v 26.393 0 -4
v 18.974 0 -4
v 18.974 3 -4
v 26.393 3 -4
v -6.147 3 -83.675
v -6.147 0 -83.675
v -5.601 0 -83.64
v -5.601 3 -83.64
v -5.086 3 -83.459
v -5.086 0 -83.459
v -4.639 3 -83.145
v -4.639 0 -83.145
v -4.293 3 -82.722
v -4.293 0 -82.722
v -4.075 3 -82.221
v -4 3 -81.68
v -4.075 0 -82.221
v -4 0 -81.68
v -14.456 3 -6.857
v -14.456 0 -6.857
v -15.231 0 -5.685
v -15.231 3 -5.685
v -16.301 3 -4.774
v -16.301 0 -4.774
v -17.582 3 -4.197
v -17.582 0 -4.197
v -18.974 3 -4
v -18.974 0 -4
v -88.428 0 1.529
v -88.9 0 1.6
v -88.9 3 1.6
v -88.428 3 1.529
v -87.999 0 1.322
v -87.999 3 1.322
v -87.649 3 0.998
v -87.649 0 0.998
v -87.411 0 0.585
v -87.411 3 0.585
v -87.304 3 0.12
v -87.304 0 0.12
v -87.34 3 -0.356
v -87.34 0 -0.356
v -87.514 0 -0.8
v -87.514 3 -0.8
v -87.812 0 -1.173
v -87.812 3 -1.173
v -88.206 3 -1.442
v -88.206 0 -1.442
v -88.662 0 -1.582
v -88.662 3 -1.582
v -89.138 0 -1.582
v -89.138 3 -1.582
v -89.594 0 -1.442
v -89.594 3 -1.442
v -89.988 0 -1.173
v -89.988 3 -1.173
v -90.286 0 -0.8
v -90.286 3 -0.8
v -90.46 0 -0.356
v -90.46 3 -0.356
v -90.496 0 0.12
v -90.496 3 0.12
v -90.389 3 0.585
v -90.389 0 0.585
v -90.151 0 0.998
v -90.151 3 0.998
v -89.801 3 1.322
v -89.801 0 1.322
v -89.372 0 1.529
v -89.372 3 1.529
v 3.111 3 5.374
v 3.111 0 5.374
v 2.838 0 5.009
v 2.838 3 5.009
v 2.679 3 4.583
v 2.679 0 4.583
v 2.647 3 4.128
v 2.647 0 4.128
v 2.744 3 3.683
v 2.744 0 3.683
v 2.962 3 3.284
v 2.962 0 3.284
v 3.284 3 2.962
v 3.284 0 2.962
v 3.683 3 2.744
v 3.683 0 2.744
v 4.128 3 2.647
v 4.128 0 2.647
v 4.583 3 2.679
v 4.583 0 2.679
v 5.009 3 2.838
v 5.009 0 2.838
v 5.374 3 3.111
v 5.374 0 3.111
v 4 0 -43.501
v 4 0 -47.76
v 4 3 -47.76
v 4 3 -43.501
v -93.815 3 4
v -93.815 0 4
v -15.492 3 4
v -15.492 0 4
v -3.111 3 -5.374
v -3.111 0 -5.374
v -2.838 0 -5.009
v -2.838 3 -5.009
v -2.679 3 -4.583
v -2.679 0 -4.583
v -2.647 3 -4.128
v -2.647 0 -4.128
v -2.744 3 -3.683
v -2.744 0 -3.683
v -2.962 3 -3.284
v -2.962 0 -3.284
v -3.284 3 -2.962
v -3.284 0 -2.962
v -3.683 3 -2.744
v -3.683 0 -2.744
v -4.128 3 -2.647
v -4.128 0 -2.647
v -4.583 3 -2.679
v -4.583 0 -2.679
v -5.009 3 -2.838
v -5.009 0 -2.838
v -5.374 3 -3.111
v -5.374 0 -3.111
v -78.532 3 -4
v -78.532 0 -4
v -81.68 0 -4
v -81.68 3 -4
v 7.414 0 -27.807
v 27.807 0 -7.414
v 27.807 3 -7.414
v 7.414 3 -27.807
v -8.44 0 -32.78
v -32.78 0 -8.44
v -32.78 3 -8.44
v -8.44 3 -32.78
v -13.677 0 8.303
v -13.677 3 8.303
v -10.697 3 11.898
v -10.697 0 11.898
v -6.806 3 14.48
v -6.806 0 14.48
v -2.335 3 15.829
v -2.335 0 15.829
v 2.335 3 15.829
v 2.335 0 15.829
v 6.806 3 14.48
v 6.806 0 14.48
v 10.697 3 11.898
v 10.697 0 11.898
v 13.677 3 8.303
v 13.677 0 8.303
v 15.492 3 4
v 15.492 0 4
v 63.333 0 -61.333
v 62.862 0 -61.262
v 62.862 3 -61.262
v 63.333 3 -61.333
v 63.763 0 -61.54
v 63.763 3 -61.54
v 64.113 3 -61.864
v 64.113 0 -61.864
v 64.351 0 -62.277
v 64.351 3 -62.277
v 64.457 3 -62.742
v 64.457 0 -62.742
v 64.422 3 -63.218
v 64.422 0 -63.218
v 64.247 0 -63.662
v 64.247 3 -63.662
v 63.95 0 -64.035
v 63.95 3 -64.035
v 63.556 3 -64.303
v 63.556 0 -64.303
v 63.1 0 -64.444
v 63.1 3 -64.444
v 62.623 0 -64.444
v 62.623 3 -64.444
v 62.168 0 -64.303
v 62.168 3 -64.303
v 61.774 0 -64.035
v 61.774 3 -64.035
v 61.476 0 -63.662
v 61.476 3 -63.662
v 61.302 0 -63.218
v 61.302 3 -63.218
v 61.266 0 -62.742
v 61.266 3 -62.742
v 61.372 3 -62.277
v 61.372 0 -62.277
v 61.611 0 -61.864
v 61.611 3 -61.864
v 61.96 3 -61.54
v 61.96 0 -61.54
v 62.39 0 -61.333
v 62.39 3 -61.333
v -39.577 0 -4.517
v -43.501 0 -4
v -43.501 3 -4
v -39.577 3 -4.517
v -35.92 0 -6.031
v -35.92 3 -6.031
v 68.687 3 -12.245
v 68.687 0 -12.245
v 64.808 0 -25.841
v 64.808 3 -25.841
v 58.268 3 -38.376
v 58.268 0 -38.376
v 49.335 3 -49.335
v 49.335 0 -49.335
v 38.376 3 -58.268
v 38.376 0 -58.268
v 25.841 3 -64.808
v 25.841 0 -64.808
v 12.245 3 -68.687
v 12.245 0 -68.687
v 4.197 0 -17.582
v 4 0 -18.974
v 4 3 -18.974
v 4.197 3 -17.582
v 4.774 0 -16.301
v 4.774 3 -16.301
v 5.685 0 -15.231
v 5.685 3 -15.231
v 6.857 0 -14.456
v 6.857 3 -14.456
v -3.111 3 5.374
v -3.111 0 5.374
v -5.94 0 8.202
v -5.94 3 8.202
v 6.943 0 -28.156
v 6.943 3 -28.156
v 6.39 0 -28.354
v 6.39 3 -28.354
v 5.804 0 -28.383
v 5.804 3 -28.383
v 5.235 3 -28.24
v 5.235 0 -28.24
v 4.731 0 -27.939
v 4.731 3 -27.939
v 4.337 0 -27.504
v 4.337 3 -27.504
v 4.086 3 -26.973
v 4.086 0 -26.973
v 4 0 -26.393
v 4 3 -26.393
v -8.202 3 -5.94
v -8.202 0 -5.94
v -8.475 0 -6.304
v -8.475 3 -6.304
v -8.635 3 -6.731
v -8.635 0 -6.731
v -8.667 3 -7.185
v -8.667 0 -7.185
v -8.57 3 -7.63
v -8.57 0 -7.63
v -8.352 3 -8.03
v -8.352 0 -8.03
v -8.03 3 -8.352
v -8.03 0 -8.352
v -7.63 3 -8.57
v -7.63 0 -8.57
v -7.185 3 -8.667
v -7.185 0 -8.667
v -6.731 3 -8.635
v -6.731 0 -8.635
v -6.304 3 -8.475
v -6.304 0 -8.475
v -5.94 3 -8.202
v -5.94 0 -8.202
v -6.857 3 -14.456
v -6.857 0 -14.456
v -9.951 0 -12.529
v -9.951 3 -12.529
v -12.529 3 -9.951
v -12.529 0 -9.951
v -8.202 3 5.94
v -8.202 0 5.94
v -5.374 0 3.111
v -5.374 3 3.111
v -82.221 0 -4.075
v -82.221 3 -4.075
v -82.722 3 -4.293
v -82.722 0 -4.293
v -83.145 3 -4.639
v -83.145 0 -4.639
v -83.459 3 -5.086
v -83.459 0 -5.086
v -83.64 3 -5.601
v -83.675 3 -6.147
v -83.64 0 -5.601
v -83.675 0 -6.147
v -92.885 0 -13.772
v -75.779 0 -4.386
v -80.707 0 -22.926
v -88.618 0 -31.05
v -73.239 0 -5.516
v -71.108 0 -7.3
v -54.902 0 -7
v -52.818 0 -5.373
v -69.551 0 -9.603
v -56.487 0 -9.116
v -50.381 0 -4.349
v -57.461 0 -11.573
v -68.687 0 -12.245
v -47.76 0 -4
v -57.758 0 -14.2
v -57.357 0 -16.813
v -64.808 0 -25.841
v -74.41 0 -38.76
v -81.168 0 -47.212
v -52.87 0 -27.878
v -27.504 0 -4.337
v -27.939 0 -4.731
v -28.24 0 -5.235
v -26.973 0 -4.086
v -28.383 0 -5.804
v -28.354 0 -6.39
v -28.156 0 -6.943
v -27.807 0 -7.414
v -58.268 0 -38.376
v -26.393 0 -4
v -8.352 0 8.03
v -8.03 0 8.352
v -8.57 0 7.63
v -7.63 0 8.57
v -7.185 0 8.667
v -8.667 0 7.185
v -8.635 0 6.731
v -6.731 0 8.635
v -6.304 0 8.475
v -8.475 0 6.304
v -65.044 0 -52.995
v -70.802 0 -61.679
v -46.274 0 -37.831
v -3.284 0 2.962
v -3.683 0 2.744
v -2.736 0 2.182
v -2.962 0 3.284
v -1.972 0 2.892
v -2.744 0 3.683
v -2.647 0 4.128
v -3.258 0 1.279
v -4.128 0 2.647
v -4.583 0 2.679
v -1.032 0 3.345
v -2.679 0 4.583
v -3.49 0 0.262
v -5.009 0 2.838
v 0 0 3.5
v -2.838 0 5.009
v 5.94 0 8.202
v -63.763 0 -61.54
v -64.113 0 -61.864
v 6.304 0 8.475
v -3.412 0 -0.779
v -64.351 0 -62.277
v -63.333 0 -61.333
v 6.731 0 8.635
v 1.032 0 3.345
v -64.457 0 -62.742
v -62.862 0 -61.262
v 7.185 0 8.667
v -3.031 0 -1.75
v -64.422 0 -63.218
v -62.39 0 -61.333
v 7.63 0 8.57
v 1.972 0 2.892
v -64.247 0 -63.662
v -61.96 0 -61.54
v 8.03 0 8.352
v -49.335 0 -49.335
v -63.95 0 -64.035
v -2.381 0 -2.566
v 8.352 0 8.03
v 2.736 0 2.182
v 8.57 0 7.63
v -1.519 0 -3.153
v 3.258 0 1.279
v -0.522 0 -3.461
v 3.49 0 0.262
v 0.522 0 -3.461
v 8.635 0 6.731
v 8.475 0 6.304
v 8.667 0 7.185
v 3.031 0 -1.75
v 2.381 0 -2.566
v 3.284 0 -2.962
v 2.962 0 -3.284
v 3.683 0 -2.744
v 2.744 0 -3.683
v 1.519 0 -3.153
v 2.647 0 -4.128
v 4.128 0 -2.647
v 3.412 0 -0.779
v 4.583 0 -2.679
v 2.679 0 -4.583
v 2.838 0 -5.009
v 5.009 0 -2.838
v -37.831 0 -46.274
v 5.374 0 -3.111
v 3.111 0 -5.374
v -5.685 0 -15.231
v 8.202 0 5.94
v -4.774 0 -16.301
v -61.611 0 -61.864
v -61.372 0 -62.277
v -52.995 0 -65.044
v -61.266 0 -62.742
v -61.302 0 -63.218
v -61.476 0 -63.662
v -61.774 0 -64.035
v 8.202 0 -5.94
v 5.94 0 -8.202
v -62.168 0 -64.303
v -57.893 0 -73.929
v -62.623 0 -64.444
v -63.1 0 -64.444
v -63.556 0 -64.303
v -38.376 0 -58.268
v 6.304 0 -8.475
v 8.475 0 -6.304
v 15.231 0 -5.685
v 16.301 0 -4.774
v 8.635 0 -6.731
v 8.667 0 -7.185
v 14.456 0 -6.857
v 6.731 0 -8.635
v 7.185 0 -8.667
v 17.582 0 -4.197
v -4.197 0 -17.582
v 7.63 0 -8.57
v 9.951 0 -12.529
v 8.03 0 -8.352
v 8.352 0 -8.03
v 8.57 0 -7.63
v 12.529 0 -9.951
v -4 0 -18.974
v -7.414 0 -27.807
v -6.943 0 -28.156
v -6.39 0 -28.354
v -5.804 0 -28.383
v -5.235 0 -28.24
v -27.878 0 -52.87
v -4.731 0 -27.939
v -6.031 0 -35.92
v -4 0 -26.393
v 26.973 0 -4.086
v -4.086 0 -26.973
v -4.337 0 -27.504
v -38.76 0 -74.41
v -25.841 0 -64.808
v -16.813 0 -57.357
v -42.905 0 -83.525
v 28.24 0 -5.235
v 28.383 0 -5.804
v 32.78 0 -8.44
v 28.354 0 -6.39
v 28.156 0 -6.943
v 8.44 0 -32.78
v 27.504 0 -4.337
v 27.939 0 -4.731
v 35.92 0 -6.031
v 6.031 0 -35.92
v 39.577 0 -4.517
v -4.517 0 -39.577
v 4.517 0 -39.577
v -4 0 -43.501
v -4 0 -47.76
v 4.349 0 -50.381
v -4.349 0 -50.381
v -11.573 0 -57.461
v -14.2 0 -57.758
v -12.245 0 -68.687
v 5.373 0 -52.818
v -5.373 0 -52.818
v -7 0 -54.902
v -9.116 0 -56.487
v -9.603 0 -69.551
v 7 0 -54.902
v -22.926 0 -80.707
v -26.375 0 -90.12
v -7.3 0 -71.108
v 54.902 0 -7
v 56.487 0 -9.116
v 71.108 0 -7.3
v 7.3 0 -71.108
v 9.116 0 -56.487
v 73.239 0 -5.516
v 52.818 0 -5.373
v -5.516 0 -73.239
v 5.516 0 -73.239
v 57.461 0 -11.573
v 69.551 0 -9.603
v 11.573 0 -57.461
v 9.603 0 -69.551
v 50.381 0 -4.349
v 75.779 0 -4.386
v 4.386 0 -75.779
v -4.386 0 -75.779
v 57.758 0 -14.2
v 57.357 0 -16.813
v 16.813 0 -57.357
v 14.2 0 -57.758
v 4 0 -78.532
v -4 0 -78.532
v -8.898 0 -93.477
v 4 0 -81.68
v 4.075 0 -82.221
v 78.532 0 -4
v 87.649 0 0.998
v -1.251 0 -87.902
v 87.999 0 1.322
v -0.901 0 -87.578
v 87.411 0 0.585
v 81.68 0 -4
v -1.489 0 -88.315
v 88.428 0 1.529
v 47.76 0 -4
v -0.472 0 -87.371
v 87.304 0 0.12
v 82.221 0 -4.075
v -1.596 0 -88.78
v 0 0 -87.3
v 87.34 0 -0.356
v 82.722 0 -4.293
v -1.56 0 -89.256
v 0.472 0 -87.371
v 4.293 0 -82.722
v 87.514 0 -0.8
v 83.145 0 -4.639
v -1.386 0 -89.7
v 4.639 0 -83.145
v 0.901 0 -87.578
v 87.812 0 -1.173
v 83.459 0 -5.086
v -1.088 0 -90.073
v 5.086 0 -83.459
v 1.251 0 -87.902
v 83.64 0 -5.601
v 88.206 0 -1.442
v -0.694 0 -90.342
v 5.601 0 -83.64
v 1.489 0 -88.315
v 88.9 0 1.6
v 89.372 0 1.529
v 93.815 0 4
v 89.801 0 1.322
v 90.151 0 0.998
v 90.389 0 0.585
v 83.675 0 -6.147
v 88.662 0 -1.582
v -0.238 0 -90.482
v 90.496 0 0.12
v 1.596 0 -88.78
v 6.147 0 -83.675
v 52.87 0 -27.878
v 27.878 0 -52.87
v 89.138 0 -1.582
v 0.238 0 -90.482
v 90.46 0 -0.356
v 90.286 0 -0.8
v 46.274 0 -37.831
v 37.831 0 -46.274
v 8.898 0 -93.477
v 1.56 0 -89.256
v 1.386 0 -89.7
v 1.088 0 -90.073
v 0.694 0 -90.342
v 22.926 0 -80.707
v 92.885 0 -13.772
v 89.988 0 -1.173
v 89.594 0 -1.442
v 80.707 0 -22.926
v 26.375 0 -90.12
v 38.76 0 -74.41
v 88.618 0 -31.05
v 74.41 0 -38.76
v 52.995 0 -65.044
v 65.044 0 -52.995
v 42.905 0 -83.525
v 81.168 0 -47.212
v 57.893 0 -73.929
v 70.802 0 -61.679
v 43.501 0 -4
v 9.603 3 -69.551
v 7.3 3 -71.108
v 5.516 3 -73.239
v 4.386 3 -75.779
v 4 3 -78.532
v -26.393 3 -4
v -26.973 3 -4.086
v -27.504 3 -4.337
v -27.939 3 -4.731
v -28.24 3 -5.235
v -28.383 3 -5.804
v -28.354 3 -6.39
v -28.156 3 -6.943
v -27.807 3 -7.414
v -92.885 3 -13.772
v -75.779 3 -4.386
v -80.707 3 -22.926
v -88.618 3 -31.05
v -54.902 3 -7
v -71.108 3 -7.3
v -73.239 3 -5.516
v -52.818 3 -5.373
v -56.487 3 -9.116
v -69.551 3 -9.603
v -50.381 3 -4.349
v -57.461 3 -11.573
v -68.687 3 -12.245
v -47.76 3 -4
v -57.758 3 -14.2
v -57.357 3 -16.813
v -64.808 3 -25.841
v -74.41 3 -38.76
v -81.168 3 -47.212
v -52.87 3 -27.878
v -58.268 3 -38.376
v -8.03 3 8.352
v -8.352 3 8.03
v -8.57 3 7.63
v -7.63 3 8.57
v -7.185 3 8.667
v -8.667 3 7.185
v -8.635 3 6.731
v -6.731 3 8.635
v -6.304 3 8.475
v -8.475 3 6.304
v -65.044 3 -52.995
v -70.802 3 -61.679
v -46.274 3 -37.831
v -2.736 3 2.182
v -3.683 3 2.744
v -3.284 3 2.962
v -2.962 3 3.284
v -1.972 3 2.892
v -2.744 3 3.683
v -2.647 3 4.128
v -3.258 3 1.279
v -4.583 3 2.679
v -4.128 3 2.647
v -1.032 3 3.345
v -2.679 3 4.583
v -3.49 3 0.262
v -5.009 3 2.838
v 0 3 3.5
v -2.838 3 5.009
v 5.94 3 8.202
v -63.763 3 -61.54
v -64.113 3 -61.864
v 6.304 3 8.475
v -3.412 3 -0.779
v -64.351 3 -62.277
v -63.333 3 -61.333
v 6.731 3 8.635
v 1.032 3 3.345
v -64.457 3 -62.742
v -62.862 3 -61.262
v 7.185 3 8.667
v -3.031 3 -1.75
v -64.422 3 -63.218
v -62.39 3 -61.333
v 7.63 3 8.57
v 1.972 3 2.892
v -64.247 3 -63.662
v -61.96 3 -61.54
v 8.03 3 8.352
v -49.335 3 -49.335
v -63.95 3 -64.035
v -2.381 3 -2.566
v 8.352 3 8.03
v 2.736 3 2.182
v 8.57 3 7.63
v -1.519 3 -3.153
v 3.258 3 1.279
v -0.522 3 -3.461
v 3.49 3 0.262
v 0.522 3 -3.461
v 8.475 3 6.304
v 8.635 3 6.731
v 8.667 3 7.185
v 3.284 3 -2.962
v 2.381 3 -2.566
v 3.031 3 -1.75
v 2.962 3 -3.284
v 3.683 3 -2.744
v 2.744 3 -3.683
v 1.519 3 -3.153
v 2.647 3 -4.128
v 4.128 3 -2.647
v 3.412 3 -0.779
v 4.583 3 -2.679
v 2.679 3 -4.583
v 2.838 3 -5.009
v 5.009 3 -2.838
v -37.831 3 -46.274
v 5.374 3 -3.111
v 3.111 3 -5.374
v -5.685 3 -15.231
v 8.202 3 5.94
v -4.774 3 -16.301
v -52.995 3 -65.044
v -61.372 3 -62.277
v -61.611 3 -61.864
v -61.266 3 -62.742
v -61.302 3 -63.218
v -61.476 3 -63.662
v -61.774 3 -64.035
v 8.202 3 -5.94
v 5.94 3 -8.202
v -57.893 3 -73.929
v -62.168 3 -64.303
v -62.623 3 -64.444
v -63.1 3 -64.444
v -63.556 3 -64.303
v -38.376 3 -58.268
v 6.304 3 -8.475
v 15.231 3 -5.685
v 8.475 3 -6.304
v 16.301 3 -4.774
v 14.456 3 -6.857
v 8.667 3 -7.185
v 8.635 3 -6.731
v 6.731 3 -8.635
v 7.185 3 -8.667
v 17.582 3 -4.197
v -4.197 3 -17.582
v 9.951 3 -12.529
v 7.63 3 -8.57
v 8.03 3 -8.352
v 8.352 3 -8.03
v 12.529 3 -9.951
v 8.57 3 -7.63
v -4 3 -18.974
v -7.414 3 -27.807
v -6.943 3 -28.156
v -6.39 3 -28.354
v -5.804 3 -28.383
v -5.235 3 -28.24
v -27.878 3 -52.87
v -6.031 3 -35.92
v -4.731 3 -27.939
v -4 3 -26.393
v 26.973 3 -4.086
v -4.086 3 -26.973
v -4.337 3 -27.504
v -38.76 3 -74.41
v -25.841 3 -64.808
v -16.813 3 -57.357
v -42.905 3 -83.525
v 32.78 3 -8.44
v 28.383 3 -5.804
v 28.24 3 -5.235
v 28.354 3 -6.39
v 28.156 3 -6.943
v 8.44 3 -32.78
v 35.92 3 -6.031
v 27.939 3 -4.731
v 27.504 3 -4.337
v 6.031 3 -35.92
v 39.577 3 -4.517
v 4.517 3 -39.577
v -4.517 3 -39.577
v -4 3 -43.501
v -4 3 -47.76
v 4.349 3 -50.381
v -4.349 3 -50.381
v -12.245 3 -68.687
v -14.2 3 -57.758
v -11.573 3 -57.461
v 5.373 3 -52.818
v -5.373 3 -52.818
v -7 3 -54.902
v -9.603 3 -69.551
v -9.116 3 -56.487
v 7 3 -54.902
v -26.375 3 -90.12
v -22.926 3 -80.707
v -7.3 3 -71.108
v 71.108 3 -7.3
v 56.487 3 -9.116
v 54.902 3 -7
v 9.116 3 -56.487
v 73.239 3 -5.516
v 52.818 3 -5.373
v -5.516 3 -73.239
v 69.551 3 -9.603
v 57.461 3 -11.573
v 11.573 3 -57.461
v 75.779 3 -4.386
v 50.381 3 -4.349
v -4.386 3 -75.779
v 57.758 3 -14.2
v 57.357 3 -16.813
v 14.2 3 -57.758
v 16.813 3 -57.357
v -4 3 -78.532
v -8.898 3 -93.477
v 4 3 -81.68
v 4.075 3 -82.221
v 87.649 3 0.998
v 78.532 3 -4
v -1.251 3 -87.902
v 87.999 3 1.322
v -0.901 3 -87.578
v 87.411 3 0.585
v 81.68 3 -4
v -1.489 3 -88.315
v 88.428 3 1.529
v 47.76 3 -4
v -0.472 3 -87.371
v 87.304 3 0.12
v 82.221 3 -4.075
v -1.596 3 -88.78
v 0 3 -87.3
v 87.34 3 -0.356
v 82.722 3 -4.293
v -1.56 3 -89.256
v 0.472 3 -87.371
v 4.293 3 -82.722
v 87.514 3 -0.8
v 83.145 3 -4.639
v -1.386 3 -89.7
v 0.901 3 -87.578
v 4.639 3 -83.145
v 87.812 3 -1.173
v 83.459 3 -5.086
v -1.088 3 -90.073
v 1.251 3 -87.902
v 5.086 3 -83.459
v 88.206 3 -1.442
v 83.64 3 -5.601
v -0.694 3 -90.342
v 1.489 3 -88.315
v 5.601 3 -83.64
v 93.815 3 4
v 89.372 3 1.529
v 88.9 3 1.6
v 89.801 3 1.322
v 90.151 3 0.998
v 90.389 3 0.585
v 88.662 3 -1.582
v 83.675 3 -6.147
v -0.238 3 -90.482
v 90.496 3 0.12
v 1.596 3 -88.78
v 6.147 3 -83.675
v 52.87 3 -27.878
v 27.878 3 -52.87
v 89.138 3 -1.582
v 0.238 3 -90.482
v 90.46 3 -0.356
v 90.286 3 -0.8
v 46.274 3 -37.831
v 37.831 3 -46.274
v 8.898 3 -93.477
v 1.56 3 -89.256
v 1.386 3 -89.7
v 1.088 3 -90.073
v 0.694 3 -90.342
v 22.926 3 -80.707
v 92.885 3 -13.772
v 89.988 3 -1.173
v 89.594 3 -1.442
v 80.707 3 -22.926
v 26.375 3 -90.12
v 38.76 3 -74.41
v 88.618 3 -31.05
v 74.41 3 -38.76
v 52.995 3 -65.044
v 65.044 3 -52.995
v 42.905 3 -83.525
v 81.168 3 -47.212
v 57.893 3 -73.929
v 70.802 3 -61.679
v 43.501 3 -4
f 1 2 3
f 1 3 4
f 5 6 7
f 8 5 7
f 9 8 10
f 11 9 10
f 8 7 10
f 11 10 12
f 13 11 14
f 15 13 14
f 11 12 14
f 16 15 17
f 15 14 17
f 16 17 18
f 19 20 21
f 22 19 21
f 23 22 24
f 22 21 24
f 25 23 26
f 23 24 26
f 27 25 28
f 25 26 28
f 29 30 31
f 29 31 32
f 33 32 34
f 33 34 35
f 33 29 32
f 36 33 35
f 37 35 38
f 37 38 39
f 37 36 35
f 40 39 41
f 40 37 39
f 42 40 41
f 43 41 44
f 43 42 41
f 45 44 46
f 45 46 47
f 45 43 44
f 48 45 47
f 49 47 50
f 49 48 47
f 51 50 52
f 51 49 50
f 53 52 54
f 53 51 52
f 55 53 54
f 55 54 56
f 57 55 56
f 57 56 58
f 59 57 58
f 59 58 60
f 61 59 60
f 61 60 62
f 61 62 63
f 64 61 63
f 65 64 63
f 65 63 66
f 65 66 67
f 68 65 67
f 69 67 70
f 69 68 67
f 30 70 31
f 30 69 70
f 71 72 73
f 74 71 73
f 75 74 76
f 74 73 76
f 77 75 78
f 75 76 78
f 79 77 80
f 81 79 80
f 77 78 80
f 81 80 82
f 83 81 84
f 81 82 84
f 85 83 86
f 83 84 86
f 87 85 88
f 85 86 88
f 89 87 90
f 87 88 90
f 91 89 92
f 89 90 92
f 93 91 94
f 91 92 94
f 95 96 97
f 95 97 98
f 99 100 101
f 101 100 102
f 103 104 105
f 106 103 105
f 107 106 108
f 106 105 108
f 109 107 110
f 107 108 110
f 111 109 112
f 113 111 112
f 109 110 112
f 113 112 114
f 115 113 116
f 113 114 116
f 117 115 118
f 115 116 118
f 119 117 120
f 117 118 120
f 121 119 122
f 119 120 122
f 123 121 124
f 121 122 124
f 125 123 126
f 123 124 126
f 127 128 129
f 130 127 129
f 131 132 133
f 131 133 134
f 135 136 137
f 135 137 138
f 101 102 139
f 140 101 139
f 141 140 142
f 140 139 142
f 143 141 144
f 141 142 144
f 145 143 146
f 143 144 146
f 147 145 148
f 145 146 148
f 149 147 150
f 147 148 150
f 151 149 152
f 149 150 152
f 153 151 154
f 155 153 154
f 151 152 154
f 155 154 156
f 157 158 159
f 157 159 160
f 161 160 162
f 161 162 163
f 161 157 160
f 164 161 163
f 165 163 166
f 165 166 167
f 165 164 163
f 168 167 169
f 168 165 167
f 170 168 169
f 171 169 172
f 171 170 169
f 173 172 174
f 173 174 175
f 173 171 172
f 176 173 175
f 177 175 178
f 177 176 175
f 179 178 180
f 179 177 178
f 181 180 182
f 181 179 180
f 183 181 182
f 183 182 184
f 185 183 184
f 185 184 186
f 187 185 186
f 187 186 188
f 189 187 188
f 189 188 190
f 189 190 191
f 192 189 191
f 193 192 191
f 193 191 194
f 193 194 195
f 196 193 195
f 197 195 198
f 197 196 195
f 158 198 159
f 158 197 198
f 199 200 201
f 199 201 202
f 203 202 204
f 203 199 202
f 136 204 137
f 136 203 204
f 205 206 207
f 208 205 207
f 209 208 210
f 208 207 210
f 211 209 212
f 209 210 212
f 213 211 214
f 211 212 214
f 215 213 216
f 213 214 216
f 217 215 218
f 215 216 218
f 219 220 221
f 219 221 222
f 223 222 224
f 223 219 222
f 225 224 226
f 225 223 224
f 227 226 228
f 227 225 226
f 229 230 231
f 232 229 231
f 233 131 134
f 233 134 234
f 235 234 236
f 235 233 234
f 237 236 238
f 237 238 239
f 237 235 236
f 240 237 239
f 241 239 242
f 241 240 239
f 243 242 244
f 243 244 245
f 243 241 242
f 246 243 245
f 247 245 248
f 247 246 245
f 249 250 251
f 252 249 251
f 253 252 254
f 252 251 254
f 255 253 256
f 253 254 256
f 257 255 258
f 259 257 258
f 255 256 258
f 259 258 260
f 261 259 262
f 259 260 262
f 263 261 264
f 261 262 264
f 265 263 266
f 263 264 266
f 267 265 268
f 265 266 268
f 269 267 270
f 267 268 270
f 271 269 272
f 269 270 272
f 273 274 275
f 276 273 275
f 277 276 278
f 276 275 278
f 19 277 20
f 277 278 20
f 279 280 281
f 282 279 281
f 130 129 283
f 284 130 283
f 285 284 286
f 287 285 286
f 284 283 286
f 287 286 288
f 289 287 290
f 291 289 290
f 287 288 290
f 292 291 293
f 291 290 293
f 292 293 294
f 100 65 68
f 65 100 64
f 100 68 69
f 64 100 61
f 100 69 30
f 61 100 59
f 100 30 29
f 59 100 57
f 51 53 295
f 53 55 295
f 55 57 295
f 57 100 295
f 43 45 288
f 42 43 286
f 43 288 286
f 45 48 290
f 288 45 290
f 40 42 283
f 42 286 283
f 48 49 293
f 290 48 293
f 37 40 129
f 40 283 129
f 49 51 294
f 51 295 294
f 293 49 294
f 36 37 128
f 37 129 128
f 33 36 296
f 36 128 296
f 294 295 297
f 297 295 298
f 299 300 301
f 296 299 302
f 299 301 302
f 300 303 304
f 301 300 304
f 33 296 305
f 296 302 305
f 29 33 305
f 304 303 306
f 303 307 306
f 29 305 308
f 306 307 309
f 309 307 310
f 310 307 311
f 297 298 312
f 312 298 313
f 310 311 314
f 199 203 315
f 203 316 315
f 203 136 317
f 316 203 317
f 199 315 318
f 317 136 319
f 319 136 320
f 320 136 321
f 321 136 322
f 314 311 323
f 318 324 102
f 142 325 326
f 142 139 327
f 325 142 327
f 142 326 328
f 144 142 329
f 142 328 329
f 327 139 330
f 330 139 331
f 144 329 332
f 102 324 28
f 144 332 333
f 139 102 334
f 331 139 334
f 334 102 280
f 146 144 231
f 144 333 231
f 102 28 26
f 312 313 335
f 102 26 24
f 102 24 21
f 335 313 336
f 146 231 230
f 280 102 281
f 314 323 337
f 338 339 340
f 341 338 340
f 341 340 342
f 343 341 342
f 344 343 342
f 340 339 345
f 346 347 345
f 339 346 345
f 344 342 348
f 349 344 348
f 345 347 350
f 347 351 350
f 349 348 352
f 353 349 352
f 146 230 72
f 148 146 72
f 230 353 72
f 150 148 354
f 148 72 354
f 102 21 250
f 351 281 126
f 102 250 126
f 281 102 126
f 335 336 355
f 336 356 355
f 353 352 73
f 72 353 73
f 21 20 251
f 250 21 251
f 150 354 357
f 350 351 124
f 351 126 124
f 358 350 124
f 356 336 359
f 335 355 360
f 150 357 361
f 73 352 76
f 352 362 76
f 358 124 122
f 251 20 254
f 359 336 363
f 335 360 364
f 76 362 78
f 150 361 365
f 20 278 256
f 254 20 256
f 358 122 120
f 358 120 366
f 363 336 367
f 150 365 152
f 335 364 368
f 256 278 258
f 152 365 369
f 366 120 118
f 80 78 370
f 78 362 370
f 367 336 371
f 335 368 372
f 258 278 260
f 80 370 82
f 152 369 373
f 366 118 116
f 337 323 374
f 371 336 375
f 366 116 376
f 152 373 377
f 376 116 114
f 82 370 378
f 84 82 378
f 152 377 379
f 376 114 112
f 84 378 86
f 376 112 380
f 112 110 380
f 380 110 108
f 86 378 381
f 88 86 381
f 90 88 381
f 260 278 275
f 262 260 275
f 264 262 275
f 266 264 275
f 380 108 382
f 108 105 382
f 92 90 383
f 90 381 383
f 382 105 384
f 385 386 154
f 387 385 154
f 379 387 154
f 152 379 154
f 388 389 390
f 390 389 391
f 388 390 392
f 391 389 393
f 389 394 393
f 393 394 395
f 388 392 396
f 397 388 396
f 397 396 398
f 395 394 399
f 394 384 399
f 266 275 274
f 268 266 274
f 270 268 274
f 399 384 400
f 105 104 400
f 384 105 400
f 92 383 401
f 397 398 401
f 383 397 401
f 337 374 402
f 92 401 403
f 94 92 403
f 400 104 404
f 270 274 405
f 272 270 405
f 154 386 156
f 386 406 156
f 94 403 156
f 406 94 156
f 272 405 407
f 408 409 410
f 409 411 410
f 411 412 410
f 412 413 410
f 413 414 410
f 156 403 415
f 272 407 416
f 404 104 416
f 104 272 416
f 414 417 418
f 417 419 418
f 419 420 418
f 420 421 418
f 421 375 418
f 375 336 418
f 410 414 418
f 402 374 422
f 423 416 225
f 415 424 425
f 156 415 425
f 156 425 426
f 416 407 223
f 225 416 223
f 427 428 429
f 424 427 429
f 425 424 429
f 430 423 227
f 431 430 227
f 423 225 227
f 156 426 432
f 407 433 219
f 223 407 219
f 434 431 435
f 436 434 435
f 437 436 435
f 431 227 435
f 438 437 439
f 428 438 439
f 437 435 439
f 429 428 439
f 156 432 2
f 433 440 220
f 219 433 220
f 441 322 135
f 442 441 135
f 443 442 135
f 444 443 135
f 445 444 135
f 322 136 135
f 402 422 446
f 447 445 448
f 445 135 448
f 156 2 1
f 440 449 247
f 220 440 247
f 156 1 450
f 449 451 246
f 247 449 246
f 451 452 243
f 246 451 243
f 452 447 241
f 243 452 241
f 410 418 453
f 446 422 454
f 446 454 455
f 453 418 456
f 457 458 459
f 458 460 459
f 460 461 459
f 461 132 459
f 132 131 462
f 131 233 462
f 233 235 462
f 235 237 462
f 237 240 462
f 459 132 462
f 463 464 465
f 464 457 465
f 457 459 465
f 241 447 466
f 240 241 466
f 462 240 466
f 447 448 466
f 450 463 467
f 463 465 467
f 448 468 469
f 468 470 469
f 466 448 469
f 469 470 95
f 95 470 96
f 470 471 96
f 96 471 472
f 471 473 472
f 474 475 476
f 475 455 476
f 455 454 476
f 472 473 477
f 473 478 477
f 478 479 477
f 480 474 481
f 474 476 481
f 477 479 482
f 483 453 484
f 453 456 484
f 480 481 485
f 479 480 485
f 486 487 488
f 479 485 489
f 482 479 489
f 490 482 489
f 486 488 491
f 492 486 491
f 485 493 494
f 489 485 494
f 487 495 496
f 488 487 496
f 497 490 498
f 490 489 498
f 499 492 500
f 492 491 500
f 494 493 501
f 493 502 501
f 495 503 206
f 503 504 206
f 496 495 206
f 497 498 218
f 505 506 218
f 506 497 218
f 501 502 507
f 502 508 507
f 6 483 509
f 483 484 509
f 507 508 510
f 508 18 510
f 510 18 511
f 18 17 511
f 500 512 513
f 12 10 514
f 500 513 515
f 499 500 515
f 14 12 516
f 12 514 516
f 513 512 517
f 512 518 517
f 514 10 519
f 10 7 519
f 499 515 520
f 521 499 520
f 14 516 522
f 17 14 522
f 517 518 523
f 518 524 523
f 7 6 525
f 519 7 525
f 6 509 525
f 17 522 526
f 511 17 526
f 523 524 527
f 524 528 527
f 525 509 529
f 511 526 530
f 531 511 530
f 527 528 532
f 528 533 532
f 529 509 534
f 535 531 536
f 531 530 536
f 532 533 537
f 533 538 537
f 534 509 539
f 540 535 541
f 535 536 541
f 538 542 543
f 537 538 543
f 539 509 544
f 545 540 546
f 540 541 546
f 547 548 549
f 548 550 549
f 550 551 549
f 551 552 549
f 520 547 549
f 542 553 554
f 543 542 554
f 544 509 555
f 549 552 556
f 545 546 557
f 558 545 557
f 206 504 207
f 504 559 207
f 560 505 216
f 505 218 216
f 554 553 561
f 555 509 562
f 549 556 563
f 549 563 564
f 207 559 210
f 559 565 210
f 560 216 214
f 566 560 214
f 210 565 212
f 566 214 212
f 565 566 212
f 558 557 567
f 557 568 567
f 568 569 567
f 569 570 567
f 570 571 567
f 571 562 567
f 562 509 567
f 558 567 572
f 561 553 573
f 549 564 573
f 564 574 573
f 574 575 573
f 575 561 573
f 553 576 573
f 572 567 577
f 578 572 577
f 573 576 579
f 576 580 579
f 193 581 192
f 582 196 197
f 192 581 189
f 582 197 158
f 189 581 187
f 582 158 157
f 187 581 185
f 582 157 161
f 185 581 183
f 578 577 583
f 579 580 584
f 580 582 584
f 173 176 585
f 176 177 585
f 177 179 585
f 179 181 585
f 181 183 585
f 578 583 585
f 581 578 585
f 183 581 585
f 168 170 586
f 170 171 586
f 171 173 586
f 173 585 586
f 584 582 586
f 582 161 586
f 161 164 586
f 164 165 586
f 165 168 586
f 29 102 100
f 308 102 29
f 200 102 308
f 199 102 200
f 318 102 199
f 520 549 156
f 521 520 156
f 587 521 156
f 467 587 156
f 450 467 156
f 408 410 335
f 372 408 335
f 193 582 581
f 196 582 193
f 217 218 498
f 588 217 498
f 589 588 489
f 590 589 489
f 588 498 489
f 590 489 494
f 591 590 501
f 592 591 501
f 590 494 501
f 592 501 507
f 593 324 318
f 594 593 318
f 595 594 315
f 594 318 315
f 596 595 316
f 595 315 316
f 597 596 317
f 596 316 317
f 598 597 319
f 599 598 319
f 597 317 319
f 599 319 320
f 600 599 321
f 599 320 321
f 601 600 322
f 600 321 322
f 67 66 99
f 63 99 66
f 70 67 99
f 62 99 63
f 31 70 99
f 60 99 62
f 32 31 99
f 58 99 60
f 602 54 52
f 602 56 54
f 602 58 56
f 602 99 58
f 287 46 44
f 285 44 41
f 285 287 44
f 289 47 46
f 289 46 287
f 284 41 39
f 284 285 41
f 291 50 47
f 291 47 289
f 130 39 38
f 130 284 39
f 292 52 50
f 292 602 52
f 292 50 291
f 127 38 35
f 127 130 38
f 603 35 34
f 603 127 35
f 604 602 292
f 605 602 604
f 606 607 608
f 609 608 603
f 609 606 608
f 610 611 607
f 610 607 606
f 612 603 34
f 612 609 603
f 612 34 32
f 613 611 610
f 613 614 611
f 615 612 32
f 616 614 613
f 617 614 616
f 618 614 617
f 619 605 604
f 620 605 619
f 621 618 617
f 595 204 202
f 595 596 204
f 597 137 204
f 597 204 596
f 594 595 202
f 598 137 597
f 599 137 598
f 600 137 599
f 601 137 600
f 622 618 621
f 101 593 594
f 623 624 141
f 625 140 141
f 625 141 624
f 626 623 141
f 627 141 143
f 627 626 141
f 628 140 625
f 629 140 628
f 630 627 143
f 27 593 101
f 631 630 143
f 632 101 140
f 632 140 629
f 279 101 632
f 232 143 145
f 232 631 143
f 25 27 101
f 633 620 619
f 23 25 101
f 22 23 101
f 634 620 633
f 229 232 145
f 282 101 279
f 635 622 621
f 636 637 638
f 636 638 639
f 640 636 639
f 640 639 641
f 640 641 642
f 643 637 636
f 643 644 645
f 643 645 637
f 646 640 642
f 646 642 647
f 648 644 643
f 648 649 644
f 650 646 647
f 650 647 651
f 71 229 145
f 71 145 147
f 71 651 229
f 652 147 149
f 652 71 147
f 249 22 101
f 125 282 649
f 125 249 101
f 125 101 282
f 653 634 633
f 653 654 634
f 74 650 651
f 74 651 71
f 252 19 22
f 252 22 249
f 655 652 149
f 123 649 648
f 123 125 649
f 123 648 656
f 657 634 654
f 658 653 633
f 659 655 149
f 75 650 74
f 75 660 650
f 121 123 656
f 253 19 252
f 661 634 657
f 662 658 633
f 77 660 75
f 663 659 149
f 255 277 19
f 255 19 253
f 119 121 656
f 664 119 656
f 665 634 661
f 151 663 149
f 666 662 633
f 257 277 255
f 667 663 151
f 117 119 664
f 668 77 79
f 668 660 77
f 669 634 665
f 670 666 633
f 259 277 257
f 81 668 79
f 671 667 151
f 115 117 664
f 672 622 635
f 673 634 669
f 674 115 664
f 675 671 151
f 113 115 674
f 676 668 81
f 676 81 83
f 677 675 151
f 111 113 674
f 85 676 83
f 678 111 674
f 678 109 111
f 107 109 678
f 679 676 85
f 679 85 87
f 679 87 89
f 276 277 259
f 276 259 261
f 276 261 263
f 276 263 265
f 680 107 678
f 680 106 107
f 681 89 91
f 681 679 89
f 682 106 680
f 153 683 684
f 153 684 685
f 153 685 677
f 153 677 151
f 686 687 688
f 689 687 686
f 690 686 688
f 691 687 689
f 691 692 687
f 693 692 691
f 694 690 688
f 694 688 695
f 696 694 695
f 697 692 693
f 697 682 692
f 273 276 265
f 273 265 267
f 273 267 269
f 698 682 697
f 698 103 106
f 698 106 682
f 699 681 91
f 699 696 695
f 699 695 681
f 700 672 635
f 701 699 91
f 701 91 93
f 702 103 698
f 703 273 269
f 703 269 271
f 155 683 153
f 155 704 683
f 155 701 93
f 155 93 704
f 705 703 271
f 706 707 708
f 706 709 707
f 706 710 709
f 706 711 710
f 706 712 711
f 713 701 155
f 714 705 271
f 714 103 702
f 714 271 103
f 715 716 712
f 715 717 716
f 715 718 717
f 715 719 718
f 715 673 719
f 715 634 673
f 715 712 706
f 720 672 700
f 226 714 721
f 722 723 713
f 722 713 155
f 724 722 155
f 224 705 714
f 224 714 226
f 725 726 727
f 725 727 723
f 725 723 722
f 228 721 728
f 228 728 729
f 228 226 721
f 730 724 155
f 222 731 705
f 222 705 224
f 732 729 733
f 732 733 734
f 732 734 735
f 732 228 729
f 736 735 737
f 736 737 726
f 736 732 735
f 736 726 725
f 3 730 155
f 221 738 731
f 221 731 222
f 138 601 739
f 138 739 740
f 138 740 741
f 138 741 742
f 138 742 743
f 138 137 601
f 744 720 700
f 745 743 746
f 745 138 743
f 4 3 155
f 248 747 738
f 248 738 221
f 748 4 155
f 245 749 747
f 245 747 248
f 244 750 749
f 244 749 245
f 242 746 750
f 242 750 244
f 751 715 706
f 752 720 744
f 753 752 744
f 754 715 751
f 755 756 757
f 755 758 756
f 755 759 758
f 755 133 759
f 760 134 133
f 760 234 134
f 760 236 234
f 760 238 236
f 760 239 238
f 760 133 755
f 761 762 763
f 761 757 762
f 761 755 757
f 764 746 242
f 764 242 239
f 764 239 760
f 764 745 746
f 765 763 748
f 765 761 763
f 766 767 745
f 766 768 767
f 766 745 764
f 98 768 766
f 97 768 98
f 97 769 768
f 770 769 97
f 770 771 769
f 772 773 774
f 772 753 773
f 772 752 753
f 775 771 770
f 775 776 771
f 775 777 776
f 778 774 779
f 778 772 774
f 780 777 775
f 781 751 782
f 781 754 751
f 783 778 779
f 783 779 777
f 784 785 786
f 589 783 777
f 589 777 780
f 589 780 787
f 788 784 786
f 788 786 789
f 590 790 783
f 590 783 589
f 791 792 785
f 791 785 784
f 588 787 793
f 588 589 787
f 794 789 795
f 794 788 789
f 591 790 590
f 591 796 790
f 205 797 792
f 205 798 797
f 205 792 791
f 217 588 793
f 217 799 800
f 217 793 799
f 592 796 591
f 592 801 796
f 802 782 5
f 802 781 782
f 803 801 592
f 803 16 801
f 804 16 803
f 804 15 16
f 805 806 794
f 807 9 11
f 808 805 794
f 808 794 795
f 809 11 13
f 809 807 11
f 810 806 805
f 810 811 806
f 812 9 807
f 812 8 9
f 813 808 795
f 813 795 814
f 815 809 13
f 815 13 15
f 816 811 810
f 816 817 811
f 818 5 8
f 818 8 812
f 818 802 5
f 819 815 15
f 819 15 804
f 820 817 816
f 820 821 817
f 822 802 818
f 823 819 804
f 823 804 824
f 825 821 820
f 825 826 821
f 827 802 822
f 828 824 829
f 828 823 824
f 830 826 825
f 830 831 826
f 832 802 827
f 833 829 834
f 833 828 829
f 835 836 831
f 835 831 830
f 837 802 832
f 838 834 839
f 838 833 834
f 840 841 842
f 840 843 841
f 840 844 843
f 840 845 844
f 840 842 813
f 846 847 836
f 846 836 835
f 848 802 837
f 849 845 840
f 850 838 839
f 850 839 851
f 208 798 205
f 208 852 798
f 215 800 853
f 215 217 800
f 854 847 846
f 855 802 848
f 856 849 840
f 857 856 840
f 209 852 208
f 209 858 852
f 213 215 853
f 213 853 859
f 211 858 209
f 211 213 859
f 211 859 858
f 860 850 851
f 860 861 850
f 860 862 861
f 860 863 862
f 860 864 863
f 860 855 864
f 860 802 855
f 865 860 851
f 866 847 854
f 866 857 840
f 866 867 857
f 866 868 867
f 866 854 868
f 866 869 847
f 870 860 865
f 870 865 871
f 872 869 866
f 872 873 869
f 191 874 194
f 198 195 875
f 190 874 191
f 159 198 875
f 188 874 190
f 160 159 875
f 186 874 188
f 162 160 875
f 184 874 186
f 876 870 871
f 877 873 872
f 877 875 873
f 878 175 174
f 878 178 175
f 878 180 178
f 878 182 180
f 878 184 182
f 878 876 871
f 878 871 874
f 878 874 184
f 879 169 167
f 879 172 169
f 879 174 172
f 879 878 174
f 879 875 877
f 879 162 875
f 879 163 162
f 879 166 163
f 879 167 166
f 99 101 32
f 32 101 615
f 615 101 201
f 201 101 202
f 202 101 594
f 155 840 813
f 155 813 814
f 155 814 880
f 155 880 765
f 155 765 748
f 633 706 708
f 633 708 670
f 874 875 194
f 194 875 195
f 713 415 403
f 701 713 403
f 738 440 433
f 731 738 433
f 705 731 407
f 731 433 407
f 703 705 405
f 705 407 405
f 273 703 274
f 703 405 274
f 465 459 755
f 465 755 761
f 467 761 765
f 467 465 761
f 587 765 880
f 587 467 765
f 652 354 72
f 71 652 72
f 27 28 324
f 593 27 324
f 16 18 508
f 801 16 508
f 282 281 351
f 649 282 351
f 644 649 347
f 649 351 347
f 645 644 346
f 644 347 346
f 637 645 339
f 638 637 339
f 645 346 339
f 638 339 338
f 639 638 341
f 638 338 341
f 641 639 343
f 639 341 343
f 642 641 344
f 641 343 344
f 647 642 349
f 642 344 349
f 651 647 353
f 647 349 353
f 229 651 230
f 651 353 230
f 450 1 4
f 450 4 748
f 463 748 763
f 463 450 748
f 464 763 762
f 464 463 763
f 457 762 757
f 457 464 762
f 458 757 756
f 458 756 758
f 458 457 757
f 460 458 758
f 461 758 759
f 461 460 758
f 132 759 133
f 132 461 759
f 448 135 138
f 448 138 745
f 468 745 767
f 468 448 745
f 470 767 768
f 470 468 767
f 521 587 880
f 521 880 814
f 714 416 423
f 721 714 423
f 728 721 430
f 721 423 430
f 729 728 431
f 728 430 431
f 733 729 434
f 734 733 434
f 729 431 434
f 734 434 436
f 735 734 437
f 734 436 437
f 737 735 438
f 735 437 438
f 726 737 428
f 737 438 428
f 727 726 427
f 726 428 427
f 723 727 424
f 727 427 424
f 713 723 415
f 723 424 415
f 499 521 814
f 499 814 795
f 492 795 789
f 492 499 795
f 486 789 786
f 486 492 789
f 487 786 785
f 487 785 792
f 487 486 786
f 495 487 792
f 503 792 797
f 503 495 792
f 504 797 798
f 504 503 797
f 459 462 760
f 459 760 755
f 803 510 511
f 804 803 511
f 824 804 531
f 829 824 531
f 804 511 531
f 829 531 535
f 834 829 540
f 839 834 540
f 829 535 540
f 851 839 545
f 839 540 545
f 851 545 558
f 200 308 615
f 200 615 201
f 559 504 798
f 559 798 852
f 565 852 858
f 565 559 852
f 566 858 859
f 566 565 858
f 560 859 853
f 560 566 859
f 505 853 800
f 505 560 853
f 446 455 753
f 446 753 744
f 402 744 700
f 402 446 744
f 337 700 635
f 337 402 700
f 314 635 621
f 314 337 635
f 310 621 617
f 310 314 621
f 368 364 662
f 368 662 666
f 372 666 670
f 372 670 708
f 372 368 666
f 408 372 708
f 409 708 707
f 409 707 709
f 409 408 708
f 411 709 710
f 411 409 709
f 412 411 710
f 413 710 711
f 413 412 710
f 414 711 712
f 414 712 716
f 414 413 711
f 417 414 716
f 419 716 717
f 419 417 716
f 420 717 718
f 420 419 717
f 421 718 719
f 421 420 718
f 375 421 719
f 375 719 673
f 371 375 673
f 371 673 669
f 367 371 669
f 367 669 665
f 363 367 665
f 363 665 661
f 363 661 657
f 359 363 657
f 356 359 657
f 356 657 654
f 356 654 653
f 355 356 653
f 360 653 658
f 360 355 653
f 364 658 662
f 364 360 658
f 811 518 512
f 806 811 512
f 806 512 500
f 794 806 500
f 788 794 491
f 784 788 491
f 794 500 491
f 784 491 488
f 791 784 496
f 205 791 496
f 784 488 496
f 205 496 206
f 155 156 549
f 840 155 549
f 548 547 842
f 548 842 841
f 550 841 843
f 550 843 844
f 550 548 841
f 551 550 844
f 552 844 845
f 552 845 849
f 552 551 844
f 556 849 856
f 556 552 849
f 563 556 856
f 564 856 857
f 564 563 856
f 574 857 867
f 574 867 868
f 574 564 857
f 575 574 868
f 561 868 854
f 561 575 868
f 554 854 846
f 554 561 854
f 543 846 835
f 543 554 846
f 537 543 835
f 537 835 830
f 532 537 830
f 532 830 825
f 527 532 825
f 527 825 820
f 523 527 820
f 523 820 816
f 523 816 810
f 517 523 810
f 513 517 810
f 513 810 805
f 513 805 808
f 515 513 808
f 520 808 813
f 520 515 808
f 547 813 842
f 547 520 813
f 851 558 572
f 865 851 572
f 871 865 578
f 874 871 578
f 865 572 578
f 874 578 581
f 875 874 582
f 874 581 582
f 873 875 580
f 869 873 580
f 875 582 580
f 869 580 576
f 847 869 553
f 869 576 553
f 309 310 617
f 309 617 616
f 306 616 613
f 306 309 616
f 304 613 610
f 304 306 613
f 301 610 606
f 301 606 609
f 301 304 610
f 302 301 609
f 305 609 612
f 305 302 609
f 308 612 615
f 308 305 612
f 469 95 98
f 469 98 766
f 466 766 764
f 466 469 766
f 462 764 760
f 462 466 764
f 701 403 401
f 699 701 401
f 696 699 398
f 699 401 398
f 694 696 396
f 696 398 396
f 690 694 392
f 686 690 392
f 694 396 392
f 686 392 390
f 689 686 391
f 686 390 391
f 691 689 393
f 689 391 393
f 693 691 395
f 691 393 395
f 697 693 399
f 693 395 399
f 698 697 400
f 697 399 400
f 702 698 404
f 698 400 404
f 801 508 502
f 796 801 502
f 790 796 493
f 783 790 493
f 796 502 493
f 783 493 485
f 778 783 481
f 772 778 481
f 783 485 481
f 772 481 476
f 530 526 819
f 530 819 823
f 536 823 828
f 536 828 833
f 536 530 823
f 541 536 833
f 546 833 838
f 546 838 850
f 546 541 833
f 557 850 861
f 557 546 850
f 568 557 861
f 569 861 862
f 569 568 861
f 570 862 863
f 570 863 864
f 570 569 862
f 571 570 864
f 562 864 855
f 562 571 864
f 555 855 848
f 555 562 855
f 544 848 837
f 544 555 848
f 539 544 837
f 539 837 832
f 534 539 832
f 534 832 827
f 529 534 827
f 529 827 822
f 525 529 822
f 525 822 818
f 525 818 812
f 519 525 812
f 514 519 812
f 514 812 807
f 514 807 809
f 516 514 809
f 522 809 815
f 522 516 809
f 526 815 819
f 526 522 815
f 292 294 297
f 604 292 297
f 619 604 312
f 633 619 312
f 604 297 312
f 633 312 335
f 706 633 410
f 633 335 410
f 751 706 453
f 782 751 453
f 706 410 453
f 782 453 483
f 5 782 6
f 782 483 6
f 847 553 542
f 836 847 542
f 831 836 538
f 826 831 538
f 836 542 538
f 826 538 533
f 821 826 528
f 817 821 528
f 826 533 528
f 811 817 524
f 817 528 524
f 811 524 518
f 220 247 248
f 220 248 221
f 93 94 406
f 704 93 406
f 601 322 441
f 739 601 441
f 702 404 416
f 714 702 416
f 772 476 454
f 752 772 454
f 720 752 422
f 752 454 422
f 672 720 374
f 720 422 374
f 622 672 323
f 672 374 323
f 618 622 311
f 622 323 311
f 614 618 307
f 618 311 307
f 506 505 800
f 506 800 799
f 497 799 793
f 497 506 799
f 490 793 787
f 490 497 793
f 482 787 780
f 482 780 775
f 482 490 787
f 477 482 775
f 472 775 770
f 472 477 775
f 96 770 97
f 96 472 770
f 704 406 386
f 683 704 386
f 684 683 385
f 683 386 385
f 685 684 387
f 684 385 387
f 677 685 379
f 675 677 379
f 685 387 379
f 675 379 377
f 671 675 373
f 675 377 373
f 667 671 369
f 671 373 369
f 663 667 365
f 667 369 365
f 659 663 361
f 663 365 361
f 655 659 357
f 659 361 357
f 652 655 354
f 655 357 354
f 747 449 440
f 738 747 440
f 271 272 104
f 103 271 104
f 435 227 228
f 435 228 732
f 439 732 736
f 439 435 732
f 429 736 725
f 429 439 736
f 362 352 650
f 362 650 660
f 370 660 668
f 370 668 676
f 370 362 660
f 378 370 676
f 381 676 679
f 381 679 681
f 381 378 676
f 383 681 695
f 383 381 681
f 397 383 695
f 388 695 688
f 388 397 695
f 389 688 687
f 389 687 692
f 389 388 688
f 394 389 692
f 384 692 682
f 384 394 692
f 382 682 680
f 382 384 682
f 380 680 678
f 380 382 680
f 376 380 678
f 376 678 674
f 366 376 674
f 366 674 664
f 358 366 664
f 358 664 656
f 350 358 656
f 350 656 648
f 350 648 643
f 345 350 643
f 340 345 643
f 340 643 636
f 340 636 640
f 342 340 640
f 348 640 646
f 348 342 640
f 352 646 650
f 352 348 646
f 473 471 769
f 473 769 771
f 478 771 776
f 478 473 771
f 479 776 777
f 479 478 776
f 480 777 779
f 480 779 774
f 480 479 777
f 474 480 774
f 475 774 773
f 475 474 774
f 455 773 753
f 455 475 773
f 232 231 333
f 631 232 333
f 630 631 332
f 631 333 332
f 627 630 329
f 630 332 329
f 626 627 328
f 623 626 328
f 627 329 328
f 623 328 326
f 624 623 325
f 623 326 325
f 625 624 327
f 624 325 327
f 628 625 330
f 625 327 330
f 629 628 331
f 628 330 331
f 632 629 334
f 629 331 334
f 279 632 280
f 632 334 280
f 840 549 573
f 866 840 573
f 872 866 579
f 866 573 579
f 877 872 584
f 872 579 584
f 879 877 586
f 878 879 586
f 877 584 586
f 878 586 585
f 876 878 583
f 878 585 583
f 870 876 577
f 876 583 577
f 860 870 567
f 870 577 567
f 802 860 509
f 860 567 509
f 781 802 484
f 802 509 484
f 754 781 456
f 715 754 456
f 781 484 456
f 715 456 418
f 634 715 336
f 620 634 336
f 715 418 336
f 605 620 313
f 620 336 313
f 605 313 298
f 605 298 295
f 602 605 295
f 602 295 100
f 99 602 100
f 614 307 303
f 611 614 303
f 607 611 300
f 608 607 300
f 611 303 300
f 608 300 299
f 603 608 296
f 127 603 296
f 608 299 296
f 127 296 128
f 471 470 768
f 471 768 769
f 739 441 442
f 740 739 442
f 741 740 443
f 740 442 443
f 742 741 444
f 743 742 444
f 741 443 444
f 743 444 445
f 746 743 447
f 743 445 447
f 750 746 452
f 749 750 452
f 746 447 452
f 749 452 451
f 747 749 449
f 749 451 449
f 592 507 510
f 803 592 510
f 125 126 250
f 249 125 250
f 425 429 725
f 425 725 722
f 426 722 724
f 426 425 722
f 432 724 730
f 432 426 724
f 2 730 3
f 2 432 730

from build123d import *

# Parameters (mm, degrees)
SKETCH_1_R      = 1.6
SKETCH_1_R_2    = 3.5
EXTRUDE_1_DEPTH = 3


with BuildPart() as part:
    # 草图1 → 凸台-拉伸1 (new body)
    with BuildSketch(Plane(origin=(0, 0, 0), x_dir=(1, 0, 0), z_dir=(0, 1, 0))):
        with BuildLine():
            Line((46.95, -4), (83.804594146, -4))
            Line((83.804594146, -4), (93.814764296, -4))
            ThreePointArc((93.814764296, -4), (0, 93.9), (-93.814764296, -4))
            Line((-93.814764296, -4), (-83.804594146, -4))
            Line((-83.804594146, -4), (-46.95, -4))
            Line((-46.95, -4), (-15.491933385, -4))
            ThreePointArc((-15.491933385, -4), (0, -16), (15.491933385, -4))
            Line((15.491933385, -4), (46.95, -4))
        make_face()
        with Locations(Location((88.9, 0, 0), (0, 0, 270))):
            Circle(SKETCH_1_R, mode=Mode.SUBTRACT)
        with Locations(Location((-88.9, 0, 0), (0, 0, 270))):
            Circle(SKETCH_1_R, mode=Mode.SUBTRACT)
        with Locations(Location((-62.861792847, 62.861792847, 0), (0, 0, 270))):
            Circle(SKETCH_1_R, mode=Mode.SUBTRACT)
        with Locations(Location((0, 88.9, 0), (0, 0, 270))):
            Circle(SKETCH_1_R, mode=Mode.SUBTRACT)
        with Locations(Location((62.861792847, 62.861792847, 0), (0, 0, 270))):
            Circle(SKETCH_1_R, mode=Mode.SUBTRACT)
        with Locations(Location((0, 0, 0), (0, 0, 270))):
            Circle(SKETCH_1_R_2, mode=Mode.SUBTRACT)
        with BuildLine():
            Line((46.95, 4), (47.760369555, 4))
            ThreePointArc((47.760369555, 4), (55.764412134, 8.005393892), (57.356586062, 16.812939522))
            ThreePointArc((57.356586062, 16.812939522), (42.263772312, 42.263772312), (16.812939522, 57.356586062))
            ThreePointArc((16.812939522, 57.356586062), (8.005393892, 55.764412134), (4, 47.760369555))
            Line((4, 47.760369555), (4, 46.95))
            Line((4, 46.95), (4, 43.500766957))
            ThreePointArc((4, 43.500766957), (5.154045583, 37.698988024), (8.440489352, 32.780477341))
            Line((8.440489352, 32.780477341), (32.780477341, 8.440489352))
            ThreePointArc((32.780477341, 8.440489352), (37.698988024, 5.154045583), (43.500766957, 4))
            Line((43.500766957, 4), (46.95, 4))
        make_face(mode=Mode.SUBTRACT)
        with BuildLine():
            Line((-46.95, 4), (-43.500766957, 4))
            ThreePointArc((-43.500766957, 4), (-37.698988024, 5.154045583), (-32.780477341, 8.440489352))
            Line((-32.780477341, 8.440489352), (-8.440489352, 32.780477341))
            ThreePointArc((-8.440489352, 32.780477341), (-5.154045583, 37.698988024), (-4, 43.500766957))
            Line((-4, 43.500766957), (-4, 46.95))
            Line((-4, 46.95), (-4, 47.760369555))
            ThreePointArc((-4, 47.760369555), (-8.005393892, 55.764412134), (-16.812939522, 57.356586062))
            ThreePointArc((-16.812939522, 57.356586062), (-42.263772312, 42.263772312), (-57.356586062, 16.812939522))
            ThreePointArc((-57.356586062, 16.812939522), (-55.764412134, 8.005393892), (-47.760369555, 4))
            Line((-47.760369555, 4), (-46.95, 4))
        make_face(mode=Mode.SUBTRACT)
        with BuildLine():
            Line((-78.53185914, 4), (-81.679924094, 4))
            ThreePointArc((-81.679924094, 4), (-83.145024823, 4.638574331), (-83.674549835, 6.146520147))
            ThreePointArc((-83.674549835, 6.146520147), (-59.326258942, 59.326258942), (-6.146520147, 83.674549835))
            ThreePointArc((-6.146520147, 83.674549835), (-4.638574331, 83.145024823), (-4, 81.679924094))
            Line((-4, 81.679924094), (-4, 78.53185914))
            ThreePointArc((-4, 78.53185914), (-6.333499574, 72.111207209), (-12.244954243, 68.687072987))
            ThreePointArc((-12.244954243, 68.687072987), (-49.334840123, 49.334840123), (-68.687072987, 12.244954243))
            ThreePointArc((-68.687072987, 12.244954243), (-72.111207209, 6.333499574), (-78.53185914, 4))
        make_face(mode=Mode.SUBTRACT)
        with BuildLine():
            Line((4, 78.53185914), (4, 81.679924094))
            ThreePointArc((4, 81.679924094), (4.638574331, 83.145024823), (6.146520147, 83.674549835))
            ThreePointArc((6.146520147, 83.674549835), (59.326258942, 59.326258942), (83.674549835, 6.146520147))
            ThreePointArc((83.674549835, 6.146520147), (83.145024823, 4.638574331), (81.679924094, 4))
            Line((81.679924094, 4), (78.53185914, 4))
            ThreePointArc((78.53185914, 4), (72.111207209, 6.333499574), (68.687072987, 12.244954243))
            ThreePointArc((68.687072987, 12.244954243), (49.334840123, 49.334840123), (12.244954243, 68.687072987))
            ThreePointArc((12.244954243, 68.687072987), (6.333499574, 72.111207209), (4, 78.53185914))
        make_face(mode=Mode.SUBTRACT)
        with BuildLine():
            Line((-27.80675313, 7.414213562), (-7.414213562, 27.80675313))
            ThreePointArc((-7.414213562, 27.80675313), (-5.234633135, 28.240298633), (-4, 26.392539568))
            Line((-4, 26.392539568), (-4, 18.973665961))
            ThreePointArc((-4, 18.973665961), (-4.774228726, 16.301053542), (-6.857142857, 14.456126446))
            ThreePointArc((-6.857142857, 14.456126446), (-11.313708499, 11.313708499), (-14.456126446, 6.857142857))
            ThreePointArc((-14.456126446, 6.857142857), (-16.301053542, 4.774228726), (-18.973665961, 4))
            Line((-18.973665961, 4), (-26.392539568, 4))
            ThreePointArc((-26.392539568, 4), (-28.240298633, 5.234633135), (-27.80675313, 7.414213562))
        make_face(mode=Mode.SUBTRACT)
        with BuildLine():
            Line((27.80675313, 7.414213562), (7.414213562, 27.80675313))
            ThreePointArc((7.414213562, 27.80675313), (5.234633135, 28.240298633), (4, 26.392539568))
            Line((4, 26.392539568), (4, 18.973665961))
            ThreePointArc((4, 18.973665961), (4.774228726, 16.301053542), (6.857142857, 14.456126446))
            ThreePointArc((6.857142857, 14.456126446), (11.313708499, 11.313708499), (14.456126446, 6.857142857))
            ThreePointArc((14.456126446, 6.857142857), (16.301053542, 4.774228726), (18.973665961, 4))
            Line((18.973665961, 4), (26.392539568, 4))
            ThreePointArc((26.392539568, 4), (28.240298633, 5.234633135), (27.80675313, 7.414213562))
        make_face(mode=Mode.SUBTRACT)
        with BuildLine():
            Line((5.939696962, -8.202438662), (3.111269837, -5.374011537))
            ThreePointArc((3.111269837, -5.374011537), (3.111269837, -3.111269837), (5.374011537, -3.111269837))
            Line((5.374011537, -3.111269837), (8.202438662, -5.939696962))
            ThreePointArc((8.202438662, -5.939696962), (8.202438662, -8.202438662), (5.939696962, -8.202438662))
        make_face(mode=Mode.SUBTRACT)
        with BuildLine():
            Line((-8.202438662, -5.939696962), (-5.374011537, -3.111269837))
            ThreePointArc((-5.374011537, -3.111269837), (-3.111269837, -3.111269837), (-3.111269837, -5.374011537))
            Line((-3.111269837, -5.374011537), (-5.939696962, -8.202438662))
            ThreePointArc((-5.939696962, -8.202438662), (-8.202438662, -8.202438662), (-8.202438662, -5.939696962))
        make_face(mode=Mode.SUBTRACT)
        with BuildLine():
            Line((-5.939696962, 8.202438662), (-3.111269837, 5.374011537))
            ThreePointArc((-3.111269837, 5.374011537), (-3.111269837, 3.111269837), (-5.374011537, 3.111269837))
            Line((-5.374011537, 3.111269837), (-8.202438662, 5.939696962))
            ThreePointArc((-8.202438662, 5.939696962), (-8.202438662, 8.202438662), (-5.939696962, 8.202438662))
        make_face(mode=Mode.SUBTRACT)
        with BuildLine():
            Line((8.202438662, 5.939696962), (5.374011537, 3.111269837))
            ThreePointArc((5.374011537, 3.111269837), (3.111269837, 3.111269837), (3.111269837, 5.374011537))
            Line((3.111269837, 5.374011537), (5.939696962, 8.202438662))
            ThreePointArc((5.939696962, 8.202438662), (8.202438662, 8.202438662), (8.202438662, 5.939696962))
        make_face(mode=Mode.SUBTRACT)
    extrude(amount=EXTRUDE_1_DEPTH)


solid = part.part
